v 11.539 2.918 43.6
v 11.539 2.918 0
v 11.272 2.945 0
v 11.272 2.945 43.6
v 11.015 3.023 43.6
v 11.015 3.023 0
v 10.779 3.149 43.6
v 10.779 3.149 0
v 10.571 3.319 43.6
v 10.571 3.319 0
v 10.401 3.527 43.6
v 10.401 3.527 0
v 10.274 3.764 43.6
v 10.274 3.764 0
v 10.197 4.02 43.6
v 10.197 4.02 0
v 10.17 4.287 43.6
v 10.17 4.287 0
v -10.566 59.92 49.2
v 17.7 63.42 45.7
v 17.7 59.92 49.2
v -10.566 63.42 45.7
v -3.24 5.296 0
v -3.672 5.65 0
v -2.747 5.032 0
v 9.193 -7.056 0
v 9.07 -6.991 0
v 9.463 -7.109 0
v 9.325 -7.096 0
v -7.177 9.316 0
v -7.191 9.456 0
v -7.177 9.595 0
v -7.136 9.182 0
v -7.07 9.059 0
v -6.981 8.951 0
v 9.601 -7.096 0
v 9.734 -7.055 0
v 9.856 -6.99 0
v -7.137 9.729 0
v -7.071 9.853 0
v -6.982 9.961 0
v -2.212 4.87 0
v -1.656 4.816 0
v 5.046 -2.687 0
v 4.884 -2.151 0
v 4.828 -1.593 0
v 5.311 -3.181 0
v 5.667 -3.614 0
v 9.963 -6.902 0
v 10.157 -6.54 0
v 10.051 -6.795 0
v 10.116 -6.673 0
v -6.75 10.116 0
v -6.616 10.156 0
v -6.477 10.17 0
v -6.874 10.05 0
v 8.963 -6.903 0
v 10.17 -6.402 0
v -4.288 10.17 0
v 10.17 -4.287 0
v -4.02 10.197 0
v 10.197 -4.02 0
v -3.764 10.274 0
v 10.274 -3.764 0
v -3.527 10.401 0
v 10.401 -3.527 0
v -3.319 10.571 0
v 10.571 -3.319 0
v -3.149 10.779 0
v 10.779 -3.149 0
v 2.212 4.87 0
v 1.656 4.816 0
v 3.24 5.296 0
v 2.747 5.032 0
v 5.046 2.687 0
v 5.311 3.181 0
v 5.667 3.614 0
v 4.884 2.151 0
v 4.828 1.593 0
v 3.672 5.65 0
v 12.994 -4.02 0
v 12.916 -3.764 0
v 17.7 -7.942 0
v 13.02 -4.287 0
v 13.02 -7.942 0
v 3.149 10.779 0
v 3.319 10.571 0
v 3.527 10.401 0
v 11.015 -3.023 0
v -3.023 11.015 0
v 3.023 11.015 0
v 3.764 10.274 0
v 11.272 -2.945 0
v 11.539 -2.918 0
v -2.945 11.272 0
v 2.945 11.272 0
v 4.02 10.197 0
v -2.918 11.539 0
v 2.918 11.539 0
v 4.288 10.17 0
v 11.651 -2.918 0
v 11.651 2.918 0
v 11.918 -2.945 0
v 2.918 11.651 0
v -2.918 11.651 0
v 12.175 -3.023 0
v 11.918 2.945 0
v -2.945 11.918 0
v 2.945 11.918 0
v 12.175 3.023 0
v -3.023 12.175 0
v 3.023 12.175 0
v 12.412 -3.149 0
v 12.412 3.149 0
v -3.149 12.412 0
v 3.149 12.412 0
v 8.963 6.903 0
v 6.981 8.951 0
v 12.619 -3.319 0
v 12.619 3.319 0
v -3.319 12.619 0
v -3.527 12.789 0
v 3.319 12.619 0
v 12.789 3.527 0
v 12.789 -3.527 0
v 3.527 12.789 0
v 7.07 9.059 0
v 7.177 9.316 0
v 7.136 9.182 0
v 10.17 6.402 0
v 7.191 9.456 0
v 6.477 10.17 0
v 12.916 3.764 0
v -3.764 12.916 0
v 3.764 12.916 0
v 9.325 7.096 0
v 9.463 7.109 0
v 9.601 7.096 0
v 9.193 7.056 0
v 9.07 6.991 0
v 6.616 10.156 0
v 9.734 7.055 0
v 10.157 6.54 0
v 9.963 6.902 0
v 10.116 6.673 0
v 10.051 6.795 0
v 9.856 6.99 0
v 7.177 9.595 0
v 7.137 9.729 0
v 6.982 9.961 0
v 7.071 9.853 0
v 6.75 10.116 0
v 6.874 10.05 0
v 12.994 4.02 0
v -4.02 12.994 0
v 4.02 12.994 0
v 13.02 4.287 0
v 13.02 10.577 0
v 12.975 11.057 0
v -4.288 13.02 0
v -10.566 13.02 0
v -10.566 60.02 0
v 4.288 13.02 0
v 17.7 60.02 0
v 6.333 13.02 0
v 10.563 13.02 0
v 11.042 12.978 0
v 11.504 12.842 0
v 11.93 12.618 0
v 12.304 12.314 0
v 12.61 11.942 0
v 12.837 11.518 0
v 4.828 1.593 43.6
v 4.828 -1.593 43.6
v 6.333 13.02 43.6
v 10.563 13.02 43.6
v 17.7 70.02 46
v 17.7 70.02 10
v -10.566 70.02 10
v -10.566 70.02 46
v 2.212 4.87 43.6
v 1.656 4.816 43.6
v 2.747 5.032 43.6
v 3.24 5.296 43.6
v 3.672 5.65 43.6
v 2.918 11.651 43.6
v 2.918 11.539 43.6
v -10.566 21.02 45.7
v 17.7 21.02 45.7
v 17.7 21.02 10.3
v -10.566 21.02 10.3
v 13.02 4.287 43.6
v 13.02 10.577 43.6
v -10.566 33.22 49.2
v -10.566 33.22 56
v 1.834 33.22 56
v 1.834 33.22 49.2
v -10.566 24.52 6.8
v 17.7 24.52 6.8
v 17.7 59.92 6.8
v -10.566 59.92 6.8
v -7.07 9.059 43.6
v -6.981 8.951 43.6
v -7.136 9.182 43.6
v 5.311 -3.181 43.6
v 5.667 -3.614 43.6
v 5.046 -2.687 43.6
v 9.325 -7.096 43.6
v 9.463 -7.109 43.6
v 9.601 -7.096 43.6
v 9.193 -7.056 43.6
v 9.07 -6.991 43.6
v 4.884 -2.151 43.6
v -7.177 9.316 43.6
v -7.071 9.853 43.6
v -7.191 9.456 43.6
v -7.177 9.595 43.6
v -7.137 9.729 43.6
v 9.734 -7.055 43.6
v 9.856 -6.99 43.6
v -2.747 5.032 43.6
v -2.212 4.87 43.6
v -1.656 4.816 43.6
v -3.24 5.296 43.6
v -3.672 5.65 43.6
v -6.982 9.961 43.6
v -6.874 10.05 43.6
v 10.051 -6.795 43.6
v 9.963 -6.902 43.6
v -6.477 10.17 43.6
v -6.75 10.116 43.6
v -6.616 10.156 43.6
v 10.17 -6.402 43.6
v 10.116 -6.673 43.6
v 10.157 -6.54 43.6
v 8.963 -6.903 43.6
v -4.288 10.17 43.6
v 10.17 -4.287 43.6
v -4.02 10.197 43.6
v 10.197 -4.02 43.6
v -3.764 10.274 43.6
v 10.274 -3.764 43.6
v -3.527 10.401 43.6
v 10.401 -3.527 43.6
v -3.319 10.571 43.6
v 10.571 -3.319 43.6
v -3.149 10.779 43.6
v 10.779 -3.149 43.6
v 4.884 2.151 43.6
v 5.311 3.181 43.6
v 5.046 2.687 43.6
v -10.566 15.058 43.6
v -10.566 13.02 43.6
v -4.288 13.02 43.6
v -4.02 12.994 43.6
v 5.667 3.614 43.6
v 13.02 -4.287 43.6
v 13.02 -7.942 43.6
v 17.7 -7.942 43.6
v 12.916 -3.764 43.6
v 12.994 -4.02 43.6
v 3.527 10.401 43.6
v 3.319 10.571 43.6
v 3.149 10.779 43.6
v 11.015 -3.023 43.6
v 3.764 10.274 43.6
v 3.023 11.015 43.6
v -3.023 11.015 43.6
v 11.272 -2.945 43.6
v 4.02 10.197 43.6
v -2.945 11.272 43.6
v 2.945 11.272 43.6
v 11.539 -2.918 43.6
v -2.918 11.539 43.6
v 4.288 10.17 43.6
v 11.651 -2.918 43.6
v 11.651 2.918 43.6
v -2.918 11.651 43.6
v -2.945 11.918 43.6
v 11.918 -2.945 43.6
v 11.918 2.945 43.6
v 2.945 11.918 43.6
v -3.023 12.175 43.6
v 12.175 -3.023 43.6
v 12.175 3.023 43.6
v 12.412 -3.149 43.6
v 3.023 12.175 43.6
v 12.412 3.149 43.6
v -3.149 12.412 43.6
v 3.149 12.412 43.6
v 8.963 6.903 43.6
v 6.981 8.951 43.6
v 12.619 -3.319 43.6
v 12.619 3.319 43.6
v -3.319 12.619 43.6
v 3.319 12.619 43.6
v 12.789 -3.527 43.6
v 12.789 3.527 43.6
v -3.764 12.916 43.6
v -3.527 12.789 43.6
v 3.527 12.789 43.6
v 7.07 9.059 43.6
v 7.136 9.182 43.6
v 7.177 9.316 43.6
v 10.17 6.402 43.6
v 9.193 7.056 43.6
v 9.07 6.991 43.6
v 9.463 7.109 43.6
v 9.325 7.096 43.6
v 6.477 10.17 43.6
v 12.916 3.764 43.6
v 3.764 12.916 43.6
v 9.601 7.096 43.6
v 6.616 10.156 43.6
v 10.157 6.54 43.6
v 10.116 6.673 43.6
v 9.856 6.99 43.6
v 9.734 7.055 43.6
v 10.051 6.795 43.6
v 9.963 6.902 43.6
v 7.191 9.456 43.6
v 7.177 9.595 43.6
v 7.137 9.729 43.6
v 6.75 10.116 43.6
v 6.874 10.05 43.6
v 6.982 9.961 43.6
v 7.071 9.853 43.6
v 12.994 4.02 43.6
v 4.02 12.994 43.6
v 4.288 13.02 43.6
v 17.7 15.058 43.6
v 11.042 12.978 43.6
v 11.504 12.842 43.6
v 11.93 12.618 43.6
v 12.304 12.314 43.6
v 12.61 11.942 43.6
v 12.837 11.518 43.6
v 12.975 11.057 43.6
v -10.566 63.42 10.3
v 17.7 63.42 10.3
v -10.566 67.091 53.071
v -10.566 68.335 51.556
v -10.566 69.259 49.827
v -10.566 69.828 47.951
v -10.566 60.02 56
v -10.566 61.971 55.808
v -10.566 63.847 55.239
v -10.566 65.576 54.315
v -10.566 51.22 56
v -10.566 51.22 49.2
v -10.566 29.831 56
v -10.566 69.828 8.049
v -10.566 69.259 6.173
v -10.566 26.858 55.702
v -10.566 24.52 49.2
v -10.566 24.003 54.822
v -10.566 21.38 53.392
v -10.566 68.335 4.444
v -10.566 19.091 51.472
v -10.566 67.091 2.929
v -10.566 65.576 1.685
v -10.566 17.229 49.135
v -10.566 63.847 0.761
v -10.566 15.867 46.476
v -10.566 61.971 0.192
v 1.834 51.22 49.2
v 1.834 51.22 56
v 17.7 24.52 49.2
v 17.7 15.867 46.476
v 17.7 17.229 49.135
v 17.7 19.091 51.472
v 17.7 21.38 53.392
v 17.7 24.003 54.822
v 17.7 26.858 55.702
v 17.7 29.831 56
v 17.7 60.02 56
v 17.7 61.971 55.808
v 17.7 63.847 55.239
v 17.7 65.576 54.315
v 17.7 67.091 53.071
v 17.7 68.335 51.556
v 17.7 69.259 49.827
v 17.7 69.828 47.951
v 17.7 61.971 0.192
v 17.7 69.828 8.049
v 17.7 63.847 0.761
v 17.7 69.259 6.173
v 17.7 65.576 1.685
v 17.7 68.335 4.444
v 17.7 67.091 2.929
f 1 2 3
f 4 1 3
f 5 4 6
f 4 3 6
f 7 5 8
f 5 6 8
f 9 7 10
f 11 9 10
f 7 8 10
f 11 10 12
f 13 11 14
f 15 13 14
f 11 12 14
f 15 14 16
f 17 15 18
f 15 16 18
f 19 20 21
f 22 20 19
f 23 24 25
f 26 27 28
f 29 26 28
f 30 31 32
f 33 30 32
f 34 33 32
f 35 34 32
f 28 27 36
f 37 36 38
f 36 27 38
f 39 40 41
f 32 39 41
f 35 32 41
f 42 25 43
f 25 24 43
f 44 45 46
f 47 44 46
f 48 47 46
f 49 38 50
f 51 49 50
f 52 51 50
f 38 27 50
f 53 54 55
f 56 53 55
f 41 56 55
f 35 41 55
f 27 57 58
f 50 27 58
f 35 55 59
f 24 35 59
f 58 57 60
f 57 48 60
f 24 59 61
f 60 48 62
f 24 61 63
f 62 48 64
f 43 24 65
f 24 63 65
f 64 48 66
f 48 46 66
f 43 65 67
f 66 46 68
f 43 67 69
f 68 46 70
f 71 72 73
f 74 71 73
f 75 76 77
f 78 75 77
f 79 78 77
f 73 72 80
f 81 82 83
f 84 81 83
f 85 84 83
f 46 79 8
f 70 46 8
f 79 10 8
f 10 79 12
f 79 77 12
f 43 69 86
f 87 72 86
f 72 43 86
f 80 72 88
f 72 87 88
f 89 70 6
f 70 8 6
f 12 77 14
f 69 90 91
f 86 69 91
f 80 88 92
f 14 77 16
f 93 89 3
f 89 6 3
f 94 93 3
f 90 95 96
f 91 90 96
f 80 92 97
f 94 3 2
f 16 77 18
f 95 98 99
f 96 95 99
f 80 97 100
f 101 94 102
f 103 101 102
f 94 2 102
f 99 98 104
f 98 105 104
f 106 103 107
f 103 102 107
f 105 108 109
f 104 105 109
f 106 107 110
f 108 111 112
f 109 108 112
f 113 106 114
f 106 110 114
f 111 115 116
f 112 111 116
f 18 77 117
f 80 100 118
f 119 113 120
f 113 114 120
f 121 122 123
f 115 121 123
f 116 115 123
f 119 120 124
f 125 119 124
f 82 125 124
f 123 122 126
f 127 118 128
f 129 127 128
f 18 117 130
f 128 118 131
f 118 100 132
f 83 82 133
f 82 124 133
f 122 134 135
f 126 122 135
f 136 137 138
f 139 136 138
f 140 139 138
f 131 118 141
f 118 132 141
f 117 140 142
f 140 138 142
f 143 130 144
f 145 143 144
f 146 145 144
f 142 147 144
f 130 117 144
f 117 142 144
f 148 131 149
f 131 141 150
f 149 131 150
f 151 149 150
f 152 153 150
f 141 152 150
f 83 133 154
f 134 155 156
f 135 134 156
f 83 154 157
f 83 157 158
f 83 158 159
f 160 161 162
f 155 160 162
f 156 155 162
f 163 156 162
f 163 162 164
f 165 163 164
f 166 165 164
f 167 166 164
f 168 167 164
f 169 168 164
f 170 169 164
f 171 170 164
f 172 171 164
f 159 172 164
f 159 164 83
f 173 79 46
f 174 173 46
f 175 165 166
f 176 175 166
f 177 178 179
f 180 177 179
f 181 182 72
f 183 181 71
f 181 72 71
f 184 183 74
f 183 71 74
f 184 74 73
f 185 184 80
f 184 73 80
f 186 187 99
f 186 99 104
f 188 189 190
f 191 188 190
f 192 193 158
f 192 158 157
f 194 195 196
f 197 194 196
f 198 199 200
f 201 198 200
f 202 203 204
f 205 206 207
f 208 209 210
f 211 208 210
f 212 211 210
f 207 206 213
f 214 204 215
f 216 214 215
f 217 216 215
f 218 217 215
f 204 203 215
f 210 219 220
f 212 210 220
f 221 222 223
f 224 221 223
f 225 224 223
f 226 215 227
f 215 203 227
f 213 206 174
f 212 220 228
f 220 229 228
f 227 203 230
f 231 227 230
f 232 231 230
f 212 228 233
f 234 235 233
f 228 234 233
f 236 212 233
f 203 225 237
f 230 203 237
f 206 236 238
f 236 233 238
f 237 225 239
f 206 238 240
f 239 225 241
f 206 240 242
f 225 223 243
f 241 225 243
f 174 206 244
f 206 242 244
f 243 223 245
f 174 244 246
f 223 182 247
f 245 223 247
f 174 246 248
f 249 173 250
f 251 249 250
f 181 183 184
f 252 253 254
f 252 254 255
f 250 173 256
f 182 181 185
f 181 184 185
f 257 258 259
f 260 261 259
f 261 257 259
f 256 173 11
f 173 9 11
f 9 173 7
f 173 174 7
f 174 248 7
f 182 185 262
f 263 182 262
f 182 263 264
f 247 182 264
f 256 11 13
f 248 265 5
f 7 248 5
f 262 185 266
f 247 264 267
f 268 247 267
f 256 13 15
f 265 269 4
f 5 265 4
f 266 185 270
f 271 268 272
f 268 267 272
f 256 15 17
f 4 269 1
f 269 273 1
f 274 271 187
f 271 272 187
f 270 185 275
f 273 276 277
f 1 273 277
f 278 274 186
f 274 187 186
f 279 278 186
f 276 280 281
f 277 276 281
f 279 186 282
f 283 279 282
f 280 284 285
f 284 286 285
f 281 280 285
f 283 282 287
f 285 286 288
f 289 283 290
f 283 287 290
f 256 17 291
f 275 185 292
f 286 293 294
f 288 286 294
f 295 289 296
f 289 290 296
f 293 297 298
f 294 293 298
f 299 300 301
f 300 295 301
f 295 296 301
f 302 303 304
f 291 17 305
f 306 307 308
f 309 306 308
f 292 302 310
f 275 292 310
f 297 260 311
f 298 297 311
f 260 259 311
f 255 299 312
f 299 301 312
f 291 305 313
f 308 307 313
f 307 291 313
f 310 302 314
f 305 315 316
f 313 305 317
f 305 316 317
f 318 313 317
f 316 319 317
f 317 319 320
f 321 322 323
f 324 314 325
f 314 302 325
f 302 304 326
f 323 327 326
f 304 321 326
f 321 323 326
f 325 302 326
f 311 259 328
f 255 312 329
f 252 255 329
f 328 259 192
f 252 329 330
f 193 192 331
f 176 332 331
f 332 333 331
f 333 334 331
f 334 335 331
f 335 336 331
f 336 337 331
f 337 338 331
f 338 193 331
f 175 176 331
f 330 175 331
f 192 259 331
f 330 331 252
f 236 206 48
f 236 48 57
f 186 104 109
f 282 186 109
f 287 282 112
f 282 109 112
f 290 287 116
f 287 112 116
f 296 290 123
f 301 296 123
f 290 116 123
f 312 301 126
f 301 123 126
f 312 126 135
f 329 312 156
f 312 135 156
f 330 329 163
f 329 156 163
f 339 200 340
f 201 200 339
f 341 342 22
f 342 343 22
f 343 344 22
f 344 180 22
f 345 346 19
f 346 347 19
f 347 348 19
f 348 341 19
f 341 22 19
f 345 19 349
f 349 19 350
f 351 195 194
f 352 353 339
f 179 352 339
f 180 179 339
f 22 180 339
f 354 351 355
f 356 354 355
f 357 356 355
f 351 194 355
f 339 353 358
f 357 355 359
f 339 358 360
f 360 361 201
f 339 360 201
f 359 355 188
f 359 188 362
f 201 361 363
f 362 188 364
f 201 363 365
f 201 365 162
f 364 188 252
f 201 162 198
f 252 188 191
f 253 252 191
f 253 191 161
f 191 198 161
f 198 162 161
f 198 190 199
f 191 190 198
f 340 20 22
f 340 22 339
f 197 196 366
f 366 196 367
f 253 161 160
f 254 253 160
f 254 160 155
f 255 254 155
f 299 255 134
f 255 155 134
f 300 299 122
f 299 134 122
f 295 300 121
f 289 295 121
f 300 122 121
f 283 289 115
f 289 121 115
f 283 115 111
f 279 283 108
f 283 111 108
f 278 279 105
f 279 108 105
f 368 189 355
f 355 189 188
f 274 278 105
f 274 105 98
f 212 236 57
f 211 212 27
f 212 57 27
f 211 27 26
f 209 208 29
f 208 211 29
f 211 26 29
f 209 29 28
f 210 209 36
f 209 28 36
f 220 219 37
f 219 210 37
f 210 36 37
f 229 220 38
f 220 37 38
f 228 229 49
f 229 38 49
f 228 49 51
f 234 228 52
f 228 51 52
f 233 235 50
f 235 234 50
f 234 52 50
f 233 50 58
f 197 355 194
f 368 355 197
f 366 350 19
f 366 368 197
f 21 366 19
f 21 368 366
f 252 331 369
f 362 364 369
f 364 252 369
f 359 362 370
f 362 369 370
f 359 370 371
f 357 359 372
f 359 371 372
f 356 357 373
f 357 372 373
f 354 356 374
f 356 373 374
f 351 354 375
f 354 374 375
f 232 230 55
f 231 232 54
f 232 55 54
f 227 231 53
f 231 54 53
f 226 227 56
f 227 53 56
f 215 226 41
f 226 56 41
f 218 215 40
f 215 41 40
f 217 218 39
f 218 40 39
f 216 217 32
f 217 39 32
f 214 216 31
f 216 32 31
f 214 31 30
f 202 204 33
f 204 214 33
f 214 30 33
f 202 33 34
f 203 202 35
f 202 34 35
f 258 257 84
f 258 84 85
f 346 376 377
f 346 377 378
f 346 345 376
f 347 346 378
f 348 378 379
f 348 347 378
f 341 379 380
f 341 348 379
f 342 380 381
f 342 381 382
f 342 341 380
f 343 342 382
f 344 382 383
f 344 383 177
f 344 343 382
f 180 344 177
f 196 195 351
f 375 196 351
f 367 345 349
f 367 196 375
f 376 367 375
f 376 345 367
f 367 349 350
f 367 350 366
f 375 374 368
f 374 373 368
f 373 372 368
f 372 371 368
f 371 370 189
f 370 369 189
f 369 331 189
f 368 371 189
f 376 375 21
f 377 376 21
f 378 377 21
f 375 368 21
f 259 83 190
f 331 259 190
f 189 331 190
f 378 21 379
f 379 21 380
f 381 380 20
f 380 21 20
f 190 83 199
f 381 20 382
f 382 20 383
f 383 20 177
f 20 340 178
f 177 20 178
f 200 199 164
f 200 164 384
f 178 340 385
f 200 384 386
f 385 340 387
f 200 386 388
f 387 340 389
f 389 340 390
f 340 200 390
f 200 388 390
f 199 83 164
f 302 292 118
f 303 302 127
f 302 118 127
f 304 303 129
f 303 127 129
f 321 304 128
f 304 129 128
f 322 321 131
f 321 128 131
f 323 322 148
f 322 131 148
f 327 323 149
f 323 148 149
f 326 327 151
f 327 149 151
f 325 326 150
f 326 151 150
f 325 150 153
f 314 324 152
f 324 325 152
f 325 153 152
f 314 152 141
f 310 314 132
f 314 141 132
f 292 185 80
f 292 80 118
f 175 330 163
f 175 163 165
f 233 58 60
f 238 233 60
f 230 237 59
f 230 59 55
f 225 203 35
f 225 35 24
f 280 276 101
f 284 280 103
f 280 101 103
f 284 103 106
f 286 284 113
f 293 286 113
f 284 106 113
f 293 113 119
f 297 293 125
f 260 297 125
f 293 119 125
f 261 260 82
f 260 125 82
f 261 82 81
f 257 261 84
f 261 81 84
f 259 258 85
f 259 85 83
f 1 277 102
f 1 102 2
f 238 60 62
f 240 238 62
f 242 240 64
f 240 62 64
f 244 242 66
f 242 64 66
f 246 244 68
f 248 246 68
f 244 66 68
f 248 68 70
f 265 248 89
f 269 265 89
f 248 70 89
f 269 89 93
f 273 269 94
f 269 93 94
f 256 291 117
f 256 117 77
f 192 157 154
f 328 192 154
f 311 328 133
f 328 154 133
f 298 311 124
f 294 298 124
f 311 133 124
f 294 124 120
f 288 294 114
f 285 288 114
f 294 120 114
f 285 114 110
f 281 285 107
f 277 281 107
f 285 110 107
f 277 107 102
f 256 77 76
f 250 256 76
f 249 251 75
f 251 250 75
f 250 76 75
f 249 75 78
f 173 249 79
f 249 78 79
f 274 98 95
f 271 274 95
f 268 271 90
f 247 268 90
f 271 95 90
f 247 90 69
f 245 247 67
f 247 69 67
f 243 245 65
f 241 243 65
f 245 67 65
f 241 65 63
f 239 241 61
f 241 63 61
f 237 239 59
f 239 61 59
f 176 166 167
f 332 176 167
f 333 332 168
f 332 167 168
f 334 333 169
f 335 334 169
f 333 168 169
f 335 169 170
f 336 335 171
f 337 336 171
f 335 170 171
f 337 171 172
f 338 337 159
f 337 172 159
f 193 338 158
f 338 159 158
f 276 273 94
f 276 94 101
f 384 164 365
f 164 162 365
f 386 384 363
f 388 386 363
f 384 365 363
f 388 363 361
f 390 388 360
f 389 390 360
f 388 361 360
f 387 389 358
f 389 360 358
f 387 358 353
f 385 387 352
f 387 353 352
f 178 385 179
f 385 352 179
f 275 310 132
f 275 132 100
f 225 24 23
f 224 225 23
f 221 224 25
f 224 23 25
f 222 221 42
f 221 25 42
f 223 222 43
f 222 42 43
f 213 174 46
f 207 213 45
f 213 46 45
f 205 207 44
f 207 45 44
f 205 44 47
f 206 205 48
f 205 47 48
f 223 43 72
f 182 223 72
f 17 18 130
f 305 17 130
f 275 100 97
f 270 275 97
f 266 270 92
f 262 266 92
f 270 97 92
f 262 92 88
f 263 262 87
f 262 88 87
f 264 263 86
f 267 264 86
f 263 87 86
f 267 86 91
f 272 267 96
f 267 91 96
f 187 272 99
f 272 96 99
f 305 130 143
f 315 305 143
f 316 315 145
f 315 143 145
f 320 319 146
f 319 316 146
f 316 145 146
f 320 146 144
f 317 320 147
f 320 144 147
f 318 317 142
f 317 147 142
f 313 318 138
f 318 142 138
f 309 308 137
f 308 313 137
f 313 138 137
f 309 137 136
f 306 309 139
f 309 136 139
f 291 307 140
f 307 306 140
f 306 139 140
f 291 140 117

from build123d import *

# Parameters (mm, degrees)
BOSS_EXTRUDE1_DEPTH = 56
SKETCH14_W          = 42.4
SKETCH14_H          = 42.4
CUT_EXTRUDE1_DEPTH  = 56
CHAMFER1_SIZE       = 3.5
FILLET1_R           = 10
SKETCH16_W          = 12.4
SKETCH16_H          = 23
CUT_EXTRUDE3_DEPTH  = 95.009532523
CUT_EXTRUDE4_REACH  = 93.39
SKETCH17_W          = 15.453545708
SKETCH17_H          = 18
FILLET4_R           = 15


with BuildPart() as part:
    # Sketch1 → Boss-Extrude1 (new body)
    with BuildSketch(Plane.XY):
        with BuildLine():
            Line((13.02, -7.9417418), (17.7, -7.9417418))
            Line((17.7, -7.9417418), (17.7, 70.02))
            Line((17.7, 70.02), (-10.566443095, 70.02))
            Line((-10.566443095, 70.02), (-10.566443095, 13.02))
            Line((-10.566443095, 13.02), (-5.317126718, 13.02))
            Line((-5.317126718, 13.02), (-4.287512407, 13.02))
            ThreePointArc((-4.287512407, 13.02), (-3.319474451, 12.619025549), (-2.9185, 11.650987593))
            Line((-2.9185, 11.650987593), (-2.9185, 11.539212407))
            ThreePointArc((-2.9185, 11.539212407), (-3.319474451, 10.571174451), (-4.287512407, 10.1702))
            Line((-4.287512407, 10.1702), (-6.476788598, 10.1702))
            ThreePointArc((-6.476788598, 10.1702), (-7.136510935, 9.729114651), (-6.981020848, 8.950903446))
            Line((-6.981020848, 8.950903446), (-3.672257405, 5.649701928))
            ThreePointArc((-3.672257405, 5.649701928), (-2.746830644, 5.032499411), (-1.655778399, 4.8158))
            Line((-1.655778399, 4.8158), (1.655778399, 4.8158))
            ThreePointArc((1.655778399, 4.8158), (2.746830644, 5.032499411), (3.672257405, 5.649701928))
            Line((3.672257405, 5.649701928), (6.981020848, 8.950903446))
            ThreePointArc((6.981020848, 8.950903446), (7.136510935, 9.729114651), (6.476788598, 10.1702))
            Line((6.476788598, 10.1702), (4.287512407, 10.1702))
            ThreePointArc((4.287512407, 10.1702), (3.319474451, 10.571174451), (2.9185, 11.539212407))
            Line((2.9185, 11.539212407), (2.9185, 11.650987593))
            ThreePointArc((2.9185, 11.650987593), (3.319474451, 12.619025549), (4.287512407, 13.02))
            Line((4.287512407, 13.02), (6.332886163, 13.02))
            Line((6.332886163, 13.02), (10.562594215, 13.019824354))
            ThreePointArc((10.562594215, 13.019824354), (12.303594776, 12.313982883), (13.019956614, 10.577284622))
            Line((13.019956614, 10.577284622), (13.02, 4.287469289))
            ThreePointArc((13.02, 4.287469289), (12.619025549, 3.319431332), (11.650987593, 2.918456882))
            Line((11.650987593, 2.918456882), (11.539212407, 2.918456882))
            ThreePointArc((11.539212407, 2.918456882), (10.571174451, 3.319431332), (10.1702, 4.287469289))
            Line((10.1702, 4.287469289), (10.1702, 6.402089023))
            ThreePointArc((10.1702, 6.402089023), (9.733877283, 7.055496588), (8.963146507, 6.90287605))
            Line((8.963146507, 6.90287605), (5.667020993, 3.614283579))
            ThreePointArc((5.667020993, 3.614283579), (5.046449321, 2.687255303), (4.8285, 1.593185507))
            Line((4.8285, 1.593185507), (4.8285, -1.593185507))
            ThreePointArc((4.8285, -1.593185507), (5.046449321, -2.687255303), (5.667020993, -3.614283579))
            Line((5.667020993, -3.614283579), (8.963146507, -6.90287605))
            ThreePointArc((8.963146507, -6.90287605), (9.733877283, -7.055496588), (10.1702, -6.402089023))
            Line((10.1702, -6.402089023), (10.1702, -4.287469289))
            ThreePointArc((10.1702, -4.287469289), (10.571174451, -3.319431332), (11.539212407, -2.918456882))
            Line((11.539212407, -2.918456882), (11.650987593, -2.918456882))
            ThreePointArc((11.650987593, -2.918456882), (12.619025549, -3.319431332), (13.02, -4.287469289))
            Line((13.02, -4.287469289), (13.02, -5.3170836))
            Line((13.02, -5.3170836), (13.02, -7.9417418))
        make_face()
    extrude(amount=BOSS_EXTRUDE1_DEPTH)

    # Sketch14 → Cut-Extrude1 (cut)
    with BuildSketch(Plane(origin=(17.7, 0, 0), x_dir=(0, 0, -1), z_dir=(1, 0, 0))):
        with Locations((-28, 42.22)):
            Rectangle(SKETCH14_W, SKETCH14_H)
    extrude(amount=-CUT_EXTRUDE1_DEPTH, mode=Mode.SUBTRACT)

    # Chamfer1
    chamfer1_edges = [part.edges().sort_by_distance(p)[0] for p in [
        (3.566778452, 21.02, 49.2),
        (3.566778452, 63.42, 49.2),
        (3.566778452, 63.42, 6.8),
        (3.566778452, 21.02, 6.8),
    ]]
    chamfer(chamfer1_edges, length=CHAMFER1_SIZE)

    # Fillet1
    fillet1_edges = [part.edges().sort_by_distance(p)[0] for p in [
        (3.566778452, 70.02, 56),
        (3.566778452, 70.02, 0),
    ]]
    fillet(fillet1_edges, radius=FILLET1_R)

    # Sketch16 → Cut-Extrude3 (cut, through all)
    with BuildSketch(Plane(origin=(17.7, 0, 0), x_dir=(0, 0, -1), z_dir=(1, 0, 0))):
        with Locations((-49.8, 3.5582582)):
            Rectangle(SKETCH16_W, SKETCH16_H)
    extrude(amount=-CUT_EXTRUDE3_DEPTH, mode=Mode.SUBTRACT)

    # Sketch17 → Cut-Extrude4 (cut, up to next)
    with BuildSketch(Plane.XY.offset(56), mode=Mode.PRIVATE) as cut_extrude4_sk1:
        with Locations((-5.893215949, 42.22)):
            Rectangle(SKETCH17_W, SKETCH17_H)
    cut_extrude4_tool1 = extrude(cut_extrude4_sk1.sketch, amount=-CUT_EXTRUDE4_REACH, mode=Mode.PRIVATE) & part.part
    add(cut_extrude4_tool1.solids().sort_by_distance((-5.893216, 42.22, 56))[0], mode=Mode.SUBTRACT)

    # Fillet4
    # the kernel refuses this fillet: 15 mm, written as the material it takes off along each edge
    with BuildSketch(Plane(origin=(54.632370625, 15.0582582, 56), x_dir=(0, 1, 0), z_dir=(-1, 0, 0))) as fillet4_piece_1:
        with BuildLine():
            CenterArc((14.77294825, 15), FILLET4_R, 189.98168298, 80.01831702)
            Line((0, 12.4), (-0.295458965, 12.348))
            ThreePointArc((-0.295458965, 12.348), (-0.3, 6.2), (-0.3, 0))
            Line((-0.3, 0), (0, -0.3))
            Line((0, -0.3), (14.77294825, -0.3))
            Line((14.77294825, -0.3), (14.77294825, 0))
        make_face()
    extrude(amount=102.131184346, mode=Mode.SUBTRACT)


solid = part.part
